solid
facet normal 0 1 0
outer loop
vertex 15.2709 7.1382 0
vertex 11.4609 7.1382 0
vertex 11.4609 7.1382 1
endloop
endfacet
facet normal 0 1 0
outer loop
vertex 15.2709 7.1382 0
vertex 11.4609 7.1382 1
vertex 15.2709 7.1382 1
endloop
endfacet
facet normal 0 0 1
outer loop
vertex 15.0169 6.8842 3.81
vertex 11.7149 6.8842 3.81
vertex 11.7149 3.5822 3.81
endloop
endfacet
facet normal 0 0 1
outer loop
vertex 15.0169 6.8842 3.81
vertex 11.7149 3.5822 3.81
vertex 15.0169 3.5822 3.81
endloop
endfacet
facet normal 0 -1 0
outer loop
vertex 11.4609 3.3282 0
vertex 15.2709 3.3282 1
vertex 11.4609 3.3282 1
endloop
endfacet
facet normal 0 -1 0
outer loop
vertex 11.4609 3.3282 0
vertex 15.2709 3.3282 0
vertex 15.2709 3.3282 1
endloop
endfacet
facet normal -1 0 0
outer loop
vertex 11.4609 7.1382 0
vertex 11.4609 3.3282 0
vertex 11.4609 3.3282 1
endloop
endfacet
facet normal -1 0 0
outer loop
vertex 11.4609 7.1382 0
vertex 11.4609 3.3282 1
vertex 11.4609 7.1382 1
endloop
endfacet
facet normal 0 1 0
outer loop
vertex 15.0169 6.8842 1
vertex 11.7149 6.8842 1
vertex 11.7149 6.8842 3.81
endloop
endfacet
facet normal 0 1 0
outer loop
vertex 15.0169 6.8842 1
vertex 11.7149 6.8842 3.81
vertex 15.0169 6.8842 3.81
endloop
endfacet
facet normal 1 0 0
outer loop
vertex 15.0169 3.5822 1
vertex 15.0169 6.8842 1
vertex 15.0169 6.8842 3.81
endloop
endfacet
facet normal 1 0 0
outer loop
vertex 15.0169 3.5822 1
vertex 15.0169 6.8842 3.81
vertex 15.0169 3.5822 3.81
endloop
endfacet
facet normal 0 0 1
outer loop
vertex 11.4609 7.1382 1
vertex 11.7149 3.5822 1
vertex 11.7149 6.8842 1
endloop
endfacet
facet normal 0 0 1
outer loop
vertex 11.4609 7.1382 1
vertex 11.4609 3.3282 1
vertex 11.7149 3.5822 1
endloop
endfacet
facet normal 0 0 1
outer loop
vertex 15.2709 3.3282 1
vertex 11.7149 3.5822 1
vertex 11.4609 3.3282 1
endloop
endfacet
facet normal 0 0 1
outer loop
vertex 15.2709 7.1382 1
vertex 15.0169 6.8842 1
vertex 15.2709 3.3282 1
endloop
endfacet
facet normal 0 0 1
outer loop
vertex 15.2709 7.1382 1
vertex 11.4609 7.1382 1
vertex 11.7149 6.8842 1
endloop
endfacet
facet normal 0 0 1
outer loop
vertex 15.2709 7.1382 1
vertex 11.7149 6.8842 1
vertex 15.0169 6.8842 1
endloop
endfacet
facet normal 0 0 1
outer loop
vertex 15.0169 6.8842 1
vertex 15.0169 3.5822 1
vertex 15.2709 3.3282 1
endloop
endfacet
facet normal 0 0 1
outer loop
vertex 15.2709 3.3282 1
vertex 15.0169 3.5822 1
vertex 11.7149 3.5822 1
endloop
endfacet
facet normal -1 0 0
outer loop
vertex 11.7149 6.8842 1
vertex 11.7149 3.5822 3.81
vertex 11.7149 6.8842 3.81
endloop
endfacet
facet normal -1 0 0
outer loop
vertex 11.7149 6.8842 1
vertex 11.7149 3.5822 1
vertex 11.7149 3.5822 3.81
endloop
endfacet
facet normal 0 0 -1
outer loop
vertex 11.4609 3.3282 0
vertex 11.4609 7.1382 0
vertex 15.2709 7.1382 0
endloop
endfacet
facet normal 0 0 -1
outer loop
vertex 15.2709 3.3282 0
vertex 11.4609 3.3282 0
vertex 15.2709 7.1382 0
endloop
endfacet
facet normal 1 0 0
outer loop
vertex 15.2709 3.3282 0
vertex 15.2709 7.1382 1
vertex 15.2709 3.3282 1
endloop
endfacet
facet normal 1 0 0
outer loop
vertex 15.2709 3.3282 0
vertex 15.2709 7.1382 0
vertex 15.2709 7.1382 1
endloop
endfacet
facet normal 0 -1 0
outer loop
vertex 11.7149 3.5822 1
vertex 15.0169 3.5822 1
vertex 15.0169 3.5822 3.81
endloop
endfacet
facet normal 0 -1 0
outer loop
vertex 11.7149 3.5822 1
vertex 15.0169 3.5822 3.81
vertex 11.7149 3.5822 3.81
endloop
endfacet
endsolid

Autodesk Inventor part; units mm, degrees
ref_plane "YZ Plane" through (0, 0, 0) normal (1, 0, 0) x (0, 1, 0)
ref_plane "XZ Plane" through (0, 0, 0) normal (0, 1, 0) x (-1, 0, 0)
ref_plane "XY Plane" through (0, 0, 0) normal (0, 0, 1) x (1, 0, 0)
sketch "Sketch1" plane through (0, 0, 0) normal (0, 0, 1) x (1, 0, 0)
  line L0 (11.4609, 7.1382) -> (15.2709, 7.1382)
  line L1 (15.2709, 7.1382) -> (15.2709, 3.3282)
  line L2 (15.2709, 3.3282) -> (11.4609, 3.3282)
  line L3 (11.4609, 3.3282) -> (11.4609, 7.1382)
  point P0 (0, 0)
  dimension "d0" = 3.81
  dimension "d1" = 3.81
extrude "Extrusion1" add sketch "Sketch1" along normal blind 1
sketch "Sketch2" plane through (0, 0, 1) normal (0, 0, 1) x (1, 0, 0)
  line L0 (15.2709, 7.1382) -> (11.4609, 7.1382) projected
  line L1 (15.2709, 3.3282) -> (15.2709, 7.1382) projected
  line L2 (11.7149, 6.8842) -> (15.0169, 6.8842)
  line L3 (15.0169, 6.8842) -> (15.0169, 3.5822)
  line L4 (15.0169, 3.5822) -> (11.7149, 3.5822)
  line L5 (11.7149, 3.5822) -> (11.7149, 6.8842)
  line L6 (11.4609, 7.1382) -> (11.4609, 3.3282) projected
  line L7 (11.4609, 3.3282) -> (15.2709, 3.3282) projected
  point P0 (0, 0)
  dimension "d6" = 0.254
  dimension "d7" = 0.254
  dimension "d10" = 0.254
  dimension "d11" = 0.254
extrude "Extrusion2" add sketch "Sketch2" along normal blind 2.81 contours L2 L3 L4 L5
properties part number "RFCoupler"
